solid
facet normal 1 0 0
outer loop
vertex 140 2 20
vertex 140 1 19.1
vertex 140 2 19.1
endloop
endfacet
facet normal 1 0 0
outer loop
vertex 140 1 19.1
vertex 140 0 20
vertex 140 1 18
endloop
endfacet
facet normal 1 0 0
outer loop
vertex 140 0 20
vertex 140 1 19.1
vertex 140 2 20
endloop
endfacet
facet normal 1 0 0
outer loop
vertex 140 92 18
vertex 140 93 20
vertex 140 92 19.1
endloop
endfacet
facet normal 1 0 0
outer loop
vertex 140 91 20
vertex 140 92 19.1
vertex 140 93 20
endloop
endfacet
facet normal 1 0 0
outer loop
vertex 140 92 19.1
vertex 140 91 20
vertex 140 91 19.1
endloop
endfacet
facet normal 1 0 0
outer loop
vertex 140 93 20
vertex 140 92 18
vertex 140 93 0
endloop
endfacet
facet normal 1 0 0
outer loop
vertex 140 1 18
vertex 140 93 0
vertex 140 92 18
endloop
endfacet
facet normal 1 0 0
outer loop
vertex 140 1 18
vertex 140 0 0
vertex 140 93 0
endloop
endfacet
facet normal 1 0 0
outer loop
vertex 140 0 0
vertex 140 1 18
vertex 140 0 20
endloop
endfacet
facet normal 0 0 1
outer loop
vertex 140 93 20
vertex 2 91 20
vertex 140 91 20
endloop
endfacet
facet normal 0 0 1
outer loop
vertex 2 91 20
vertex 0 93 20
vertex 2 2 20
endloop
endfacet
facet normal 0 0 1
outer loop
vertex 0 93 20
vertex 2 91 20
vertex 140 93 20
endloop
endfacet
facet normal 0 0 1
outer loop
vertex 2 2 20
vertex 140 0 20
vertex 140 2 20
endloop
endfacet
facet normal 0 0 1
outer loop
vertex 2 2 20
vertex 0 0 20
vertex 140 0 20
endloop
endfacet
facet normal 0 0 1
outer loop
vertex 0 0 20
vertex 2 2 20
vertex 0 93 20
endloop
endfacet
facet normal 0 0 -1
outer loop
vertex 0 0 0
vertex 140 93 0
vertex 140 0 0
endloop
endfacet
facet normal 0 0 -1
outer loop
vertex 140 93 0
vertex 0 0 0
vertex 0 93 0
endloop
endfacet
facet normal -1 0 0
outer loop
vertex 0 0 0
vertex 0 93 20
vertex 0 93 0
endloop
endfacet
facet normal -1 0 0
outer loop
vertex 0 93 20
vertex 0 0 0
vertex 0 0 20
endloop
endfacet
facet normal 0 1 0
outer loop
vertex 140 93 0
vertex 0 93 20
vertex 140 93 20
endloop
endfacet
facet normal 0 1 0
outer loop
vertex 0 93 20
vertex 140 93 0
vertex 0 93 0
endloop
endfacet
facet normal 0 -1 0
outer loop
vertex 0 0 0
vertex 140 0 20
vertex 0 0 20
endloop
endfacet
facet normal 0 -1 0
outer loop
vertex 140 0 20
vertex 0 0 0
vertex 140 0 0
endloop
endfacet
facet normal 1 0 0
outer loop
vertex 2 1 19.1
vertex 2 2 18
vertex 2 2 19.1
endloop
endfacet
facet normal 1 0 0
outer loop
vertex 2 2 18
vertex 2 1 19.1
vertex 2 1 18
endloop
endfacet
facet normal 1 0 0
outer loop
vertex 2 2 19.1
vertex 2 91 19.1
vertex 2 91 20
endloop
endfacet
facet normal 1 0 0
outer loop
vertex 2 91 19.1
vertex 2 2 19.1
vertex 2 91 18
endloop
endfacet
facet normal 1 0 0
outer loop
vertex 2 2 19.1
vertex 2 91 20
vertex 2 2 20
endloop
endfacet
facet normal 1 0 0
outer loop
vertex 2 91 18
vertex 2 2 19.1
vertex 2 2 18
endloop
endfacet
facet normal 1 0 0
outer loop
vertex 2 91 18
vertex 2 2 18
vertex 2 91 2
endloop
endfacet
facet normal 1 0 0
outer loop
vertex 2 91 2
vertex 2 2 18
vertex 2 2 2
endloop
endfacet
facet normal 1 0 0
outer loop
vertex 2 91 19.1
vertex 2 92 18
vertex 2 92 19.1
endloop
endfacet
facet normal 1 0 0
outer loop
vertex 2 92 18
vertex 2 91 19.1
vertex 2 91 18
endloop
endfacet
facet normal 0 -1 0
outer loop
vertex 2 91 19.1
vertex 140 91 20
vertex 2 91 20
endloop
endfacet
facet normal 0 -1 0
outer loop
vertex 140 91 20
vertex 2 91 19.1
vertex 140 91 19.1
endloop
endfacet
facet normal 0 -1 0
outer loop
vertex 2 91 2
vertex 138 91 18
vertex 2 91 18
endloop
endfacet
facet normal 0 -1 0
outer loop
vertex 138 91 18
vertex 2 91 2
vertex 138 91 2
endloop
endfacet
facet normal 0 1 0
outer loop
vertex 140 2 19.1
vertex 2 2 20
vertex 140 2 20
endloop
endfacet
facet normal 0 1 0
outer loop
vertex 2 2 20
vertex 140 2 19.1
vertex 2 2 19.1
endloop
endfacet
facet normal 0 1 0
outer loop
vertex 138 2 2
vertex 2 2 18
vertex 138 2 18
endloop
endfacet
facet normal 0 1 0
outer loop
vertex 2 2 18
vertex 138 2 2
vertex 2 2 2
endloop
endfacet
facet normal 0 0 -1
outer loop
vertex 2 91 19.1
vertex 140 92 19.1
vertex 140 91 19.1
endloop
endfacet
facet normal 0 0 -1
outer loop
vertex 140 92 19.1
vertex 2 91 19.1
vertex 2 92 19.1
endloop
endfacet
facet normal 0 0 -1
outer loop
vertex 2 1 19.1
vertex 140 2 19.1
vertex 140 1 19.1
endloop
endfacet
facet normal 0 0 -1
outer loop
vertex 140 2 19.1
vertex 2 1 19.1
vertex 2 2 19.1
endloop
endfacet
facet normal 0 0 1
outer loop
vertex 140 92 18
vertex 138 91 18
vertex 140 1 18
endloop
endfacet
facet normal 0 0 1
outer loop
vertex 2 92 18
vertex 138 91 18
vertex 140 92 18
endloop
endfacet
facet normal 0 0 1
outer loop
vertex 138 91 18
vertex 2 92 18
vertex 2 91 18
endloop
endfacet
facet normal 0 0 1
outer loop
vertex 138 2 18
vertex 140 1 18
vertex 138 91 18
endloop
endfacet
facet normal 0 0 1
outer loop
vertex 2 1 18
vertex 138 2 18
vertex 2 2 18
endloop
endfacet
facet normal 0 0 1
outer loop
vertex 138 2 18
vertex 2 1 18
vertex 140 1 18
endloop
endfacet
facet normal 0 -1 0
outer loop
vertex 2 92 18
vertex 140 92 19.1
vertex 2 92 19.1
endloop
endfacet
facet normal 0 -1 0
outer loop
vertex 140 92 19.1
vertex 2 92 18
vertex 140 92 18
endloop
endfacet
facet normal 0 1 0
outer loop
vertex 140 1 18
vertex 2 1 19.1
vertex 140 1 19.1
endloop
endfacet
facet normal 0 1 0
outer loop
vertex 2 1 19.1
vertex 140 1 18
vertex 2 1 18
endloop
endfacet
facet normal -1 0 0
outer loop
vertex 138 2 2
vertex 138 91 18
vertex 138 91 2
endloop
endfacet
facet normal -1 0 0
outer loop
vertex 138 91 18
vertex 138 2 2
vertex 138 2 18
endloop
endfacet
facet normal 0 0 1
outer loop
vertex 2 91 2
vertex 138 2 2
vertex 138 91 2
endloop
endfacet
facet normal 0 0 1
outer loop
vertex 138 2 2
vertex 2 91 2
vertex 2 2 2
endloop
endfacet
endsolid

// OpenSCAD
// +++ CONFIG +++
X_CARD = 145-4-1;
Y_CARD = 98-4-1; 
Z_CARD = 25-4-1;

R_FINGERHELP =10;

PW_FLOOR = 2; // PoWer
PW_WALL = 1.5;
X_LEN_WALL = len_wall(15); // LENght
Y_LEN_WALL = len_wall(7);
function len_wall(len_wall) = len_wall+PW_WALL;



// +++ MAKE +++
difference() {
	cube([ X_CARD , Y_CARD , Z_CARD ]);
	// Deckel
	translate([ 2 , 2 , Z_CARD-1 ]) cube([ X_CARD , Y_CARD-4 , 1.1 ]);
	translate([ 2 , 1 , Z_CARD-2 ]) cube([ X_CARD , Y_CARD-2 , 1.1 ]);
	// Bauch
	translate([ 2 , 2 , 2 ]) cube([ X_CARD-4 , Y_CARD-4 , Z_CARD ]);
};
